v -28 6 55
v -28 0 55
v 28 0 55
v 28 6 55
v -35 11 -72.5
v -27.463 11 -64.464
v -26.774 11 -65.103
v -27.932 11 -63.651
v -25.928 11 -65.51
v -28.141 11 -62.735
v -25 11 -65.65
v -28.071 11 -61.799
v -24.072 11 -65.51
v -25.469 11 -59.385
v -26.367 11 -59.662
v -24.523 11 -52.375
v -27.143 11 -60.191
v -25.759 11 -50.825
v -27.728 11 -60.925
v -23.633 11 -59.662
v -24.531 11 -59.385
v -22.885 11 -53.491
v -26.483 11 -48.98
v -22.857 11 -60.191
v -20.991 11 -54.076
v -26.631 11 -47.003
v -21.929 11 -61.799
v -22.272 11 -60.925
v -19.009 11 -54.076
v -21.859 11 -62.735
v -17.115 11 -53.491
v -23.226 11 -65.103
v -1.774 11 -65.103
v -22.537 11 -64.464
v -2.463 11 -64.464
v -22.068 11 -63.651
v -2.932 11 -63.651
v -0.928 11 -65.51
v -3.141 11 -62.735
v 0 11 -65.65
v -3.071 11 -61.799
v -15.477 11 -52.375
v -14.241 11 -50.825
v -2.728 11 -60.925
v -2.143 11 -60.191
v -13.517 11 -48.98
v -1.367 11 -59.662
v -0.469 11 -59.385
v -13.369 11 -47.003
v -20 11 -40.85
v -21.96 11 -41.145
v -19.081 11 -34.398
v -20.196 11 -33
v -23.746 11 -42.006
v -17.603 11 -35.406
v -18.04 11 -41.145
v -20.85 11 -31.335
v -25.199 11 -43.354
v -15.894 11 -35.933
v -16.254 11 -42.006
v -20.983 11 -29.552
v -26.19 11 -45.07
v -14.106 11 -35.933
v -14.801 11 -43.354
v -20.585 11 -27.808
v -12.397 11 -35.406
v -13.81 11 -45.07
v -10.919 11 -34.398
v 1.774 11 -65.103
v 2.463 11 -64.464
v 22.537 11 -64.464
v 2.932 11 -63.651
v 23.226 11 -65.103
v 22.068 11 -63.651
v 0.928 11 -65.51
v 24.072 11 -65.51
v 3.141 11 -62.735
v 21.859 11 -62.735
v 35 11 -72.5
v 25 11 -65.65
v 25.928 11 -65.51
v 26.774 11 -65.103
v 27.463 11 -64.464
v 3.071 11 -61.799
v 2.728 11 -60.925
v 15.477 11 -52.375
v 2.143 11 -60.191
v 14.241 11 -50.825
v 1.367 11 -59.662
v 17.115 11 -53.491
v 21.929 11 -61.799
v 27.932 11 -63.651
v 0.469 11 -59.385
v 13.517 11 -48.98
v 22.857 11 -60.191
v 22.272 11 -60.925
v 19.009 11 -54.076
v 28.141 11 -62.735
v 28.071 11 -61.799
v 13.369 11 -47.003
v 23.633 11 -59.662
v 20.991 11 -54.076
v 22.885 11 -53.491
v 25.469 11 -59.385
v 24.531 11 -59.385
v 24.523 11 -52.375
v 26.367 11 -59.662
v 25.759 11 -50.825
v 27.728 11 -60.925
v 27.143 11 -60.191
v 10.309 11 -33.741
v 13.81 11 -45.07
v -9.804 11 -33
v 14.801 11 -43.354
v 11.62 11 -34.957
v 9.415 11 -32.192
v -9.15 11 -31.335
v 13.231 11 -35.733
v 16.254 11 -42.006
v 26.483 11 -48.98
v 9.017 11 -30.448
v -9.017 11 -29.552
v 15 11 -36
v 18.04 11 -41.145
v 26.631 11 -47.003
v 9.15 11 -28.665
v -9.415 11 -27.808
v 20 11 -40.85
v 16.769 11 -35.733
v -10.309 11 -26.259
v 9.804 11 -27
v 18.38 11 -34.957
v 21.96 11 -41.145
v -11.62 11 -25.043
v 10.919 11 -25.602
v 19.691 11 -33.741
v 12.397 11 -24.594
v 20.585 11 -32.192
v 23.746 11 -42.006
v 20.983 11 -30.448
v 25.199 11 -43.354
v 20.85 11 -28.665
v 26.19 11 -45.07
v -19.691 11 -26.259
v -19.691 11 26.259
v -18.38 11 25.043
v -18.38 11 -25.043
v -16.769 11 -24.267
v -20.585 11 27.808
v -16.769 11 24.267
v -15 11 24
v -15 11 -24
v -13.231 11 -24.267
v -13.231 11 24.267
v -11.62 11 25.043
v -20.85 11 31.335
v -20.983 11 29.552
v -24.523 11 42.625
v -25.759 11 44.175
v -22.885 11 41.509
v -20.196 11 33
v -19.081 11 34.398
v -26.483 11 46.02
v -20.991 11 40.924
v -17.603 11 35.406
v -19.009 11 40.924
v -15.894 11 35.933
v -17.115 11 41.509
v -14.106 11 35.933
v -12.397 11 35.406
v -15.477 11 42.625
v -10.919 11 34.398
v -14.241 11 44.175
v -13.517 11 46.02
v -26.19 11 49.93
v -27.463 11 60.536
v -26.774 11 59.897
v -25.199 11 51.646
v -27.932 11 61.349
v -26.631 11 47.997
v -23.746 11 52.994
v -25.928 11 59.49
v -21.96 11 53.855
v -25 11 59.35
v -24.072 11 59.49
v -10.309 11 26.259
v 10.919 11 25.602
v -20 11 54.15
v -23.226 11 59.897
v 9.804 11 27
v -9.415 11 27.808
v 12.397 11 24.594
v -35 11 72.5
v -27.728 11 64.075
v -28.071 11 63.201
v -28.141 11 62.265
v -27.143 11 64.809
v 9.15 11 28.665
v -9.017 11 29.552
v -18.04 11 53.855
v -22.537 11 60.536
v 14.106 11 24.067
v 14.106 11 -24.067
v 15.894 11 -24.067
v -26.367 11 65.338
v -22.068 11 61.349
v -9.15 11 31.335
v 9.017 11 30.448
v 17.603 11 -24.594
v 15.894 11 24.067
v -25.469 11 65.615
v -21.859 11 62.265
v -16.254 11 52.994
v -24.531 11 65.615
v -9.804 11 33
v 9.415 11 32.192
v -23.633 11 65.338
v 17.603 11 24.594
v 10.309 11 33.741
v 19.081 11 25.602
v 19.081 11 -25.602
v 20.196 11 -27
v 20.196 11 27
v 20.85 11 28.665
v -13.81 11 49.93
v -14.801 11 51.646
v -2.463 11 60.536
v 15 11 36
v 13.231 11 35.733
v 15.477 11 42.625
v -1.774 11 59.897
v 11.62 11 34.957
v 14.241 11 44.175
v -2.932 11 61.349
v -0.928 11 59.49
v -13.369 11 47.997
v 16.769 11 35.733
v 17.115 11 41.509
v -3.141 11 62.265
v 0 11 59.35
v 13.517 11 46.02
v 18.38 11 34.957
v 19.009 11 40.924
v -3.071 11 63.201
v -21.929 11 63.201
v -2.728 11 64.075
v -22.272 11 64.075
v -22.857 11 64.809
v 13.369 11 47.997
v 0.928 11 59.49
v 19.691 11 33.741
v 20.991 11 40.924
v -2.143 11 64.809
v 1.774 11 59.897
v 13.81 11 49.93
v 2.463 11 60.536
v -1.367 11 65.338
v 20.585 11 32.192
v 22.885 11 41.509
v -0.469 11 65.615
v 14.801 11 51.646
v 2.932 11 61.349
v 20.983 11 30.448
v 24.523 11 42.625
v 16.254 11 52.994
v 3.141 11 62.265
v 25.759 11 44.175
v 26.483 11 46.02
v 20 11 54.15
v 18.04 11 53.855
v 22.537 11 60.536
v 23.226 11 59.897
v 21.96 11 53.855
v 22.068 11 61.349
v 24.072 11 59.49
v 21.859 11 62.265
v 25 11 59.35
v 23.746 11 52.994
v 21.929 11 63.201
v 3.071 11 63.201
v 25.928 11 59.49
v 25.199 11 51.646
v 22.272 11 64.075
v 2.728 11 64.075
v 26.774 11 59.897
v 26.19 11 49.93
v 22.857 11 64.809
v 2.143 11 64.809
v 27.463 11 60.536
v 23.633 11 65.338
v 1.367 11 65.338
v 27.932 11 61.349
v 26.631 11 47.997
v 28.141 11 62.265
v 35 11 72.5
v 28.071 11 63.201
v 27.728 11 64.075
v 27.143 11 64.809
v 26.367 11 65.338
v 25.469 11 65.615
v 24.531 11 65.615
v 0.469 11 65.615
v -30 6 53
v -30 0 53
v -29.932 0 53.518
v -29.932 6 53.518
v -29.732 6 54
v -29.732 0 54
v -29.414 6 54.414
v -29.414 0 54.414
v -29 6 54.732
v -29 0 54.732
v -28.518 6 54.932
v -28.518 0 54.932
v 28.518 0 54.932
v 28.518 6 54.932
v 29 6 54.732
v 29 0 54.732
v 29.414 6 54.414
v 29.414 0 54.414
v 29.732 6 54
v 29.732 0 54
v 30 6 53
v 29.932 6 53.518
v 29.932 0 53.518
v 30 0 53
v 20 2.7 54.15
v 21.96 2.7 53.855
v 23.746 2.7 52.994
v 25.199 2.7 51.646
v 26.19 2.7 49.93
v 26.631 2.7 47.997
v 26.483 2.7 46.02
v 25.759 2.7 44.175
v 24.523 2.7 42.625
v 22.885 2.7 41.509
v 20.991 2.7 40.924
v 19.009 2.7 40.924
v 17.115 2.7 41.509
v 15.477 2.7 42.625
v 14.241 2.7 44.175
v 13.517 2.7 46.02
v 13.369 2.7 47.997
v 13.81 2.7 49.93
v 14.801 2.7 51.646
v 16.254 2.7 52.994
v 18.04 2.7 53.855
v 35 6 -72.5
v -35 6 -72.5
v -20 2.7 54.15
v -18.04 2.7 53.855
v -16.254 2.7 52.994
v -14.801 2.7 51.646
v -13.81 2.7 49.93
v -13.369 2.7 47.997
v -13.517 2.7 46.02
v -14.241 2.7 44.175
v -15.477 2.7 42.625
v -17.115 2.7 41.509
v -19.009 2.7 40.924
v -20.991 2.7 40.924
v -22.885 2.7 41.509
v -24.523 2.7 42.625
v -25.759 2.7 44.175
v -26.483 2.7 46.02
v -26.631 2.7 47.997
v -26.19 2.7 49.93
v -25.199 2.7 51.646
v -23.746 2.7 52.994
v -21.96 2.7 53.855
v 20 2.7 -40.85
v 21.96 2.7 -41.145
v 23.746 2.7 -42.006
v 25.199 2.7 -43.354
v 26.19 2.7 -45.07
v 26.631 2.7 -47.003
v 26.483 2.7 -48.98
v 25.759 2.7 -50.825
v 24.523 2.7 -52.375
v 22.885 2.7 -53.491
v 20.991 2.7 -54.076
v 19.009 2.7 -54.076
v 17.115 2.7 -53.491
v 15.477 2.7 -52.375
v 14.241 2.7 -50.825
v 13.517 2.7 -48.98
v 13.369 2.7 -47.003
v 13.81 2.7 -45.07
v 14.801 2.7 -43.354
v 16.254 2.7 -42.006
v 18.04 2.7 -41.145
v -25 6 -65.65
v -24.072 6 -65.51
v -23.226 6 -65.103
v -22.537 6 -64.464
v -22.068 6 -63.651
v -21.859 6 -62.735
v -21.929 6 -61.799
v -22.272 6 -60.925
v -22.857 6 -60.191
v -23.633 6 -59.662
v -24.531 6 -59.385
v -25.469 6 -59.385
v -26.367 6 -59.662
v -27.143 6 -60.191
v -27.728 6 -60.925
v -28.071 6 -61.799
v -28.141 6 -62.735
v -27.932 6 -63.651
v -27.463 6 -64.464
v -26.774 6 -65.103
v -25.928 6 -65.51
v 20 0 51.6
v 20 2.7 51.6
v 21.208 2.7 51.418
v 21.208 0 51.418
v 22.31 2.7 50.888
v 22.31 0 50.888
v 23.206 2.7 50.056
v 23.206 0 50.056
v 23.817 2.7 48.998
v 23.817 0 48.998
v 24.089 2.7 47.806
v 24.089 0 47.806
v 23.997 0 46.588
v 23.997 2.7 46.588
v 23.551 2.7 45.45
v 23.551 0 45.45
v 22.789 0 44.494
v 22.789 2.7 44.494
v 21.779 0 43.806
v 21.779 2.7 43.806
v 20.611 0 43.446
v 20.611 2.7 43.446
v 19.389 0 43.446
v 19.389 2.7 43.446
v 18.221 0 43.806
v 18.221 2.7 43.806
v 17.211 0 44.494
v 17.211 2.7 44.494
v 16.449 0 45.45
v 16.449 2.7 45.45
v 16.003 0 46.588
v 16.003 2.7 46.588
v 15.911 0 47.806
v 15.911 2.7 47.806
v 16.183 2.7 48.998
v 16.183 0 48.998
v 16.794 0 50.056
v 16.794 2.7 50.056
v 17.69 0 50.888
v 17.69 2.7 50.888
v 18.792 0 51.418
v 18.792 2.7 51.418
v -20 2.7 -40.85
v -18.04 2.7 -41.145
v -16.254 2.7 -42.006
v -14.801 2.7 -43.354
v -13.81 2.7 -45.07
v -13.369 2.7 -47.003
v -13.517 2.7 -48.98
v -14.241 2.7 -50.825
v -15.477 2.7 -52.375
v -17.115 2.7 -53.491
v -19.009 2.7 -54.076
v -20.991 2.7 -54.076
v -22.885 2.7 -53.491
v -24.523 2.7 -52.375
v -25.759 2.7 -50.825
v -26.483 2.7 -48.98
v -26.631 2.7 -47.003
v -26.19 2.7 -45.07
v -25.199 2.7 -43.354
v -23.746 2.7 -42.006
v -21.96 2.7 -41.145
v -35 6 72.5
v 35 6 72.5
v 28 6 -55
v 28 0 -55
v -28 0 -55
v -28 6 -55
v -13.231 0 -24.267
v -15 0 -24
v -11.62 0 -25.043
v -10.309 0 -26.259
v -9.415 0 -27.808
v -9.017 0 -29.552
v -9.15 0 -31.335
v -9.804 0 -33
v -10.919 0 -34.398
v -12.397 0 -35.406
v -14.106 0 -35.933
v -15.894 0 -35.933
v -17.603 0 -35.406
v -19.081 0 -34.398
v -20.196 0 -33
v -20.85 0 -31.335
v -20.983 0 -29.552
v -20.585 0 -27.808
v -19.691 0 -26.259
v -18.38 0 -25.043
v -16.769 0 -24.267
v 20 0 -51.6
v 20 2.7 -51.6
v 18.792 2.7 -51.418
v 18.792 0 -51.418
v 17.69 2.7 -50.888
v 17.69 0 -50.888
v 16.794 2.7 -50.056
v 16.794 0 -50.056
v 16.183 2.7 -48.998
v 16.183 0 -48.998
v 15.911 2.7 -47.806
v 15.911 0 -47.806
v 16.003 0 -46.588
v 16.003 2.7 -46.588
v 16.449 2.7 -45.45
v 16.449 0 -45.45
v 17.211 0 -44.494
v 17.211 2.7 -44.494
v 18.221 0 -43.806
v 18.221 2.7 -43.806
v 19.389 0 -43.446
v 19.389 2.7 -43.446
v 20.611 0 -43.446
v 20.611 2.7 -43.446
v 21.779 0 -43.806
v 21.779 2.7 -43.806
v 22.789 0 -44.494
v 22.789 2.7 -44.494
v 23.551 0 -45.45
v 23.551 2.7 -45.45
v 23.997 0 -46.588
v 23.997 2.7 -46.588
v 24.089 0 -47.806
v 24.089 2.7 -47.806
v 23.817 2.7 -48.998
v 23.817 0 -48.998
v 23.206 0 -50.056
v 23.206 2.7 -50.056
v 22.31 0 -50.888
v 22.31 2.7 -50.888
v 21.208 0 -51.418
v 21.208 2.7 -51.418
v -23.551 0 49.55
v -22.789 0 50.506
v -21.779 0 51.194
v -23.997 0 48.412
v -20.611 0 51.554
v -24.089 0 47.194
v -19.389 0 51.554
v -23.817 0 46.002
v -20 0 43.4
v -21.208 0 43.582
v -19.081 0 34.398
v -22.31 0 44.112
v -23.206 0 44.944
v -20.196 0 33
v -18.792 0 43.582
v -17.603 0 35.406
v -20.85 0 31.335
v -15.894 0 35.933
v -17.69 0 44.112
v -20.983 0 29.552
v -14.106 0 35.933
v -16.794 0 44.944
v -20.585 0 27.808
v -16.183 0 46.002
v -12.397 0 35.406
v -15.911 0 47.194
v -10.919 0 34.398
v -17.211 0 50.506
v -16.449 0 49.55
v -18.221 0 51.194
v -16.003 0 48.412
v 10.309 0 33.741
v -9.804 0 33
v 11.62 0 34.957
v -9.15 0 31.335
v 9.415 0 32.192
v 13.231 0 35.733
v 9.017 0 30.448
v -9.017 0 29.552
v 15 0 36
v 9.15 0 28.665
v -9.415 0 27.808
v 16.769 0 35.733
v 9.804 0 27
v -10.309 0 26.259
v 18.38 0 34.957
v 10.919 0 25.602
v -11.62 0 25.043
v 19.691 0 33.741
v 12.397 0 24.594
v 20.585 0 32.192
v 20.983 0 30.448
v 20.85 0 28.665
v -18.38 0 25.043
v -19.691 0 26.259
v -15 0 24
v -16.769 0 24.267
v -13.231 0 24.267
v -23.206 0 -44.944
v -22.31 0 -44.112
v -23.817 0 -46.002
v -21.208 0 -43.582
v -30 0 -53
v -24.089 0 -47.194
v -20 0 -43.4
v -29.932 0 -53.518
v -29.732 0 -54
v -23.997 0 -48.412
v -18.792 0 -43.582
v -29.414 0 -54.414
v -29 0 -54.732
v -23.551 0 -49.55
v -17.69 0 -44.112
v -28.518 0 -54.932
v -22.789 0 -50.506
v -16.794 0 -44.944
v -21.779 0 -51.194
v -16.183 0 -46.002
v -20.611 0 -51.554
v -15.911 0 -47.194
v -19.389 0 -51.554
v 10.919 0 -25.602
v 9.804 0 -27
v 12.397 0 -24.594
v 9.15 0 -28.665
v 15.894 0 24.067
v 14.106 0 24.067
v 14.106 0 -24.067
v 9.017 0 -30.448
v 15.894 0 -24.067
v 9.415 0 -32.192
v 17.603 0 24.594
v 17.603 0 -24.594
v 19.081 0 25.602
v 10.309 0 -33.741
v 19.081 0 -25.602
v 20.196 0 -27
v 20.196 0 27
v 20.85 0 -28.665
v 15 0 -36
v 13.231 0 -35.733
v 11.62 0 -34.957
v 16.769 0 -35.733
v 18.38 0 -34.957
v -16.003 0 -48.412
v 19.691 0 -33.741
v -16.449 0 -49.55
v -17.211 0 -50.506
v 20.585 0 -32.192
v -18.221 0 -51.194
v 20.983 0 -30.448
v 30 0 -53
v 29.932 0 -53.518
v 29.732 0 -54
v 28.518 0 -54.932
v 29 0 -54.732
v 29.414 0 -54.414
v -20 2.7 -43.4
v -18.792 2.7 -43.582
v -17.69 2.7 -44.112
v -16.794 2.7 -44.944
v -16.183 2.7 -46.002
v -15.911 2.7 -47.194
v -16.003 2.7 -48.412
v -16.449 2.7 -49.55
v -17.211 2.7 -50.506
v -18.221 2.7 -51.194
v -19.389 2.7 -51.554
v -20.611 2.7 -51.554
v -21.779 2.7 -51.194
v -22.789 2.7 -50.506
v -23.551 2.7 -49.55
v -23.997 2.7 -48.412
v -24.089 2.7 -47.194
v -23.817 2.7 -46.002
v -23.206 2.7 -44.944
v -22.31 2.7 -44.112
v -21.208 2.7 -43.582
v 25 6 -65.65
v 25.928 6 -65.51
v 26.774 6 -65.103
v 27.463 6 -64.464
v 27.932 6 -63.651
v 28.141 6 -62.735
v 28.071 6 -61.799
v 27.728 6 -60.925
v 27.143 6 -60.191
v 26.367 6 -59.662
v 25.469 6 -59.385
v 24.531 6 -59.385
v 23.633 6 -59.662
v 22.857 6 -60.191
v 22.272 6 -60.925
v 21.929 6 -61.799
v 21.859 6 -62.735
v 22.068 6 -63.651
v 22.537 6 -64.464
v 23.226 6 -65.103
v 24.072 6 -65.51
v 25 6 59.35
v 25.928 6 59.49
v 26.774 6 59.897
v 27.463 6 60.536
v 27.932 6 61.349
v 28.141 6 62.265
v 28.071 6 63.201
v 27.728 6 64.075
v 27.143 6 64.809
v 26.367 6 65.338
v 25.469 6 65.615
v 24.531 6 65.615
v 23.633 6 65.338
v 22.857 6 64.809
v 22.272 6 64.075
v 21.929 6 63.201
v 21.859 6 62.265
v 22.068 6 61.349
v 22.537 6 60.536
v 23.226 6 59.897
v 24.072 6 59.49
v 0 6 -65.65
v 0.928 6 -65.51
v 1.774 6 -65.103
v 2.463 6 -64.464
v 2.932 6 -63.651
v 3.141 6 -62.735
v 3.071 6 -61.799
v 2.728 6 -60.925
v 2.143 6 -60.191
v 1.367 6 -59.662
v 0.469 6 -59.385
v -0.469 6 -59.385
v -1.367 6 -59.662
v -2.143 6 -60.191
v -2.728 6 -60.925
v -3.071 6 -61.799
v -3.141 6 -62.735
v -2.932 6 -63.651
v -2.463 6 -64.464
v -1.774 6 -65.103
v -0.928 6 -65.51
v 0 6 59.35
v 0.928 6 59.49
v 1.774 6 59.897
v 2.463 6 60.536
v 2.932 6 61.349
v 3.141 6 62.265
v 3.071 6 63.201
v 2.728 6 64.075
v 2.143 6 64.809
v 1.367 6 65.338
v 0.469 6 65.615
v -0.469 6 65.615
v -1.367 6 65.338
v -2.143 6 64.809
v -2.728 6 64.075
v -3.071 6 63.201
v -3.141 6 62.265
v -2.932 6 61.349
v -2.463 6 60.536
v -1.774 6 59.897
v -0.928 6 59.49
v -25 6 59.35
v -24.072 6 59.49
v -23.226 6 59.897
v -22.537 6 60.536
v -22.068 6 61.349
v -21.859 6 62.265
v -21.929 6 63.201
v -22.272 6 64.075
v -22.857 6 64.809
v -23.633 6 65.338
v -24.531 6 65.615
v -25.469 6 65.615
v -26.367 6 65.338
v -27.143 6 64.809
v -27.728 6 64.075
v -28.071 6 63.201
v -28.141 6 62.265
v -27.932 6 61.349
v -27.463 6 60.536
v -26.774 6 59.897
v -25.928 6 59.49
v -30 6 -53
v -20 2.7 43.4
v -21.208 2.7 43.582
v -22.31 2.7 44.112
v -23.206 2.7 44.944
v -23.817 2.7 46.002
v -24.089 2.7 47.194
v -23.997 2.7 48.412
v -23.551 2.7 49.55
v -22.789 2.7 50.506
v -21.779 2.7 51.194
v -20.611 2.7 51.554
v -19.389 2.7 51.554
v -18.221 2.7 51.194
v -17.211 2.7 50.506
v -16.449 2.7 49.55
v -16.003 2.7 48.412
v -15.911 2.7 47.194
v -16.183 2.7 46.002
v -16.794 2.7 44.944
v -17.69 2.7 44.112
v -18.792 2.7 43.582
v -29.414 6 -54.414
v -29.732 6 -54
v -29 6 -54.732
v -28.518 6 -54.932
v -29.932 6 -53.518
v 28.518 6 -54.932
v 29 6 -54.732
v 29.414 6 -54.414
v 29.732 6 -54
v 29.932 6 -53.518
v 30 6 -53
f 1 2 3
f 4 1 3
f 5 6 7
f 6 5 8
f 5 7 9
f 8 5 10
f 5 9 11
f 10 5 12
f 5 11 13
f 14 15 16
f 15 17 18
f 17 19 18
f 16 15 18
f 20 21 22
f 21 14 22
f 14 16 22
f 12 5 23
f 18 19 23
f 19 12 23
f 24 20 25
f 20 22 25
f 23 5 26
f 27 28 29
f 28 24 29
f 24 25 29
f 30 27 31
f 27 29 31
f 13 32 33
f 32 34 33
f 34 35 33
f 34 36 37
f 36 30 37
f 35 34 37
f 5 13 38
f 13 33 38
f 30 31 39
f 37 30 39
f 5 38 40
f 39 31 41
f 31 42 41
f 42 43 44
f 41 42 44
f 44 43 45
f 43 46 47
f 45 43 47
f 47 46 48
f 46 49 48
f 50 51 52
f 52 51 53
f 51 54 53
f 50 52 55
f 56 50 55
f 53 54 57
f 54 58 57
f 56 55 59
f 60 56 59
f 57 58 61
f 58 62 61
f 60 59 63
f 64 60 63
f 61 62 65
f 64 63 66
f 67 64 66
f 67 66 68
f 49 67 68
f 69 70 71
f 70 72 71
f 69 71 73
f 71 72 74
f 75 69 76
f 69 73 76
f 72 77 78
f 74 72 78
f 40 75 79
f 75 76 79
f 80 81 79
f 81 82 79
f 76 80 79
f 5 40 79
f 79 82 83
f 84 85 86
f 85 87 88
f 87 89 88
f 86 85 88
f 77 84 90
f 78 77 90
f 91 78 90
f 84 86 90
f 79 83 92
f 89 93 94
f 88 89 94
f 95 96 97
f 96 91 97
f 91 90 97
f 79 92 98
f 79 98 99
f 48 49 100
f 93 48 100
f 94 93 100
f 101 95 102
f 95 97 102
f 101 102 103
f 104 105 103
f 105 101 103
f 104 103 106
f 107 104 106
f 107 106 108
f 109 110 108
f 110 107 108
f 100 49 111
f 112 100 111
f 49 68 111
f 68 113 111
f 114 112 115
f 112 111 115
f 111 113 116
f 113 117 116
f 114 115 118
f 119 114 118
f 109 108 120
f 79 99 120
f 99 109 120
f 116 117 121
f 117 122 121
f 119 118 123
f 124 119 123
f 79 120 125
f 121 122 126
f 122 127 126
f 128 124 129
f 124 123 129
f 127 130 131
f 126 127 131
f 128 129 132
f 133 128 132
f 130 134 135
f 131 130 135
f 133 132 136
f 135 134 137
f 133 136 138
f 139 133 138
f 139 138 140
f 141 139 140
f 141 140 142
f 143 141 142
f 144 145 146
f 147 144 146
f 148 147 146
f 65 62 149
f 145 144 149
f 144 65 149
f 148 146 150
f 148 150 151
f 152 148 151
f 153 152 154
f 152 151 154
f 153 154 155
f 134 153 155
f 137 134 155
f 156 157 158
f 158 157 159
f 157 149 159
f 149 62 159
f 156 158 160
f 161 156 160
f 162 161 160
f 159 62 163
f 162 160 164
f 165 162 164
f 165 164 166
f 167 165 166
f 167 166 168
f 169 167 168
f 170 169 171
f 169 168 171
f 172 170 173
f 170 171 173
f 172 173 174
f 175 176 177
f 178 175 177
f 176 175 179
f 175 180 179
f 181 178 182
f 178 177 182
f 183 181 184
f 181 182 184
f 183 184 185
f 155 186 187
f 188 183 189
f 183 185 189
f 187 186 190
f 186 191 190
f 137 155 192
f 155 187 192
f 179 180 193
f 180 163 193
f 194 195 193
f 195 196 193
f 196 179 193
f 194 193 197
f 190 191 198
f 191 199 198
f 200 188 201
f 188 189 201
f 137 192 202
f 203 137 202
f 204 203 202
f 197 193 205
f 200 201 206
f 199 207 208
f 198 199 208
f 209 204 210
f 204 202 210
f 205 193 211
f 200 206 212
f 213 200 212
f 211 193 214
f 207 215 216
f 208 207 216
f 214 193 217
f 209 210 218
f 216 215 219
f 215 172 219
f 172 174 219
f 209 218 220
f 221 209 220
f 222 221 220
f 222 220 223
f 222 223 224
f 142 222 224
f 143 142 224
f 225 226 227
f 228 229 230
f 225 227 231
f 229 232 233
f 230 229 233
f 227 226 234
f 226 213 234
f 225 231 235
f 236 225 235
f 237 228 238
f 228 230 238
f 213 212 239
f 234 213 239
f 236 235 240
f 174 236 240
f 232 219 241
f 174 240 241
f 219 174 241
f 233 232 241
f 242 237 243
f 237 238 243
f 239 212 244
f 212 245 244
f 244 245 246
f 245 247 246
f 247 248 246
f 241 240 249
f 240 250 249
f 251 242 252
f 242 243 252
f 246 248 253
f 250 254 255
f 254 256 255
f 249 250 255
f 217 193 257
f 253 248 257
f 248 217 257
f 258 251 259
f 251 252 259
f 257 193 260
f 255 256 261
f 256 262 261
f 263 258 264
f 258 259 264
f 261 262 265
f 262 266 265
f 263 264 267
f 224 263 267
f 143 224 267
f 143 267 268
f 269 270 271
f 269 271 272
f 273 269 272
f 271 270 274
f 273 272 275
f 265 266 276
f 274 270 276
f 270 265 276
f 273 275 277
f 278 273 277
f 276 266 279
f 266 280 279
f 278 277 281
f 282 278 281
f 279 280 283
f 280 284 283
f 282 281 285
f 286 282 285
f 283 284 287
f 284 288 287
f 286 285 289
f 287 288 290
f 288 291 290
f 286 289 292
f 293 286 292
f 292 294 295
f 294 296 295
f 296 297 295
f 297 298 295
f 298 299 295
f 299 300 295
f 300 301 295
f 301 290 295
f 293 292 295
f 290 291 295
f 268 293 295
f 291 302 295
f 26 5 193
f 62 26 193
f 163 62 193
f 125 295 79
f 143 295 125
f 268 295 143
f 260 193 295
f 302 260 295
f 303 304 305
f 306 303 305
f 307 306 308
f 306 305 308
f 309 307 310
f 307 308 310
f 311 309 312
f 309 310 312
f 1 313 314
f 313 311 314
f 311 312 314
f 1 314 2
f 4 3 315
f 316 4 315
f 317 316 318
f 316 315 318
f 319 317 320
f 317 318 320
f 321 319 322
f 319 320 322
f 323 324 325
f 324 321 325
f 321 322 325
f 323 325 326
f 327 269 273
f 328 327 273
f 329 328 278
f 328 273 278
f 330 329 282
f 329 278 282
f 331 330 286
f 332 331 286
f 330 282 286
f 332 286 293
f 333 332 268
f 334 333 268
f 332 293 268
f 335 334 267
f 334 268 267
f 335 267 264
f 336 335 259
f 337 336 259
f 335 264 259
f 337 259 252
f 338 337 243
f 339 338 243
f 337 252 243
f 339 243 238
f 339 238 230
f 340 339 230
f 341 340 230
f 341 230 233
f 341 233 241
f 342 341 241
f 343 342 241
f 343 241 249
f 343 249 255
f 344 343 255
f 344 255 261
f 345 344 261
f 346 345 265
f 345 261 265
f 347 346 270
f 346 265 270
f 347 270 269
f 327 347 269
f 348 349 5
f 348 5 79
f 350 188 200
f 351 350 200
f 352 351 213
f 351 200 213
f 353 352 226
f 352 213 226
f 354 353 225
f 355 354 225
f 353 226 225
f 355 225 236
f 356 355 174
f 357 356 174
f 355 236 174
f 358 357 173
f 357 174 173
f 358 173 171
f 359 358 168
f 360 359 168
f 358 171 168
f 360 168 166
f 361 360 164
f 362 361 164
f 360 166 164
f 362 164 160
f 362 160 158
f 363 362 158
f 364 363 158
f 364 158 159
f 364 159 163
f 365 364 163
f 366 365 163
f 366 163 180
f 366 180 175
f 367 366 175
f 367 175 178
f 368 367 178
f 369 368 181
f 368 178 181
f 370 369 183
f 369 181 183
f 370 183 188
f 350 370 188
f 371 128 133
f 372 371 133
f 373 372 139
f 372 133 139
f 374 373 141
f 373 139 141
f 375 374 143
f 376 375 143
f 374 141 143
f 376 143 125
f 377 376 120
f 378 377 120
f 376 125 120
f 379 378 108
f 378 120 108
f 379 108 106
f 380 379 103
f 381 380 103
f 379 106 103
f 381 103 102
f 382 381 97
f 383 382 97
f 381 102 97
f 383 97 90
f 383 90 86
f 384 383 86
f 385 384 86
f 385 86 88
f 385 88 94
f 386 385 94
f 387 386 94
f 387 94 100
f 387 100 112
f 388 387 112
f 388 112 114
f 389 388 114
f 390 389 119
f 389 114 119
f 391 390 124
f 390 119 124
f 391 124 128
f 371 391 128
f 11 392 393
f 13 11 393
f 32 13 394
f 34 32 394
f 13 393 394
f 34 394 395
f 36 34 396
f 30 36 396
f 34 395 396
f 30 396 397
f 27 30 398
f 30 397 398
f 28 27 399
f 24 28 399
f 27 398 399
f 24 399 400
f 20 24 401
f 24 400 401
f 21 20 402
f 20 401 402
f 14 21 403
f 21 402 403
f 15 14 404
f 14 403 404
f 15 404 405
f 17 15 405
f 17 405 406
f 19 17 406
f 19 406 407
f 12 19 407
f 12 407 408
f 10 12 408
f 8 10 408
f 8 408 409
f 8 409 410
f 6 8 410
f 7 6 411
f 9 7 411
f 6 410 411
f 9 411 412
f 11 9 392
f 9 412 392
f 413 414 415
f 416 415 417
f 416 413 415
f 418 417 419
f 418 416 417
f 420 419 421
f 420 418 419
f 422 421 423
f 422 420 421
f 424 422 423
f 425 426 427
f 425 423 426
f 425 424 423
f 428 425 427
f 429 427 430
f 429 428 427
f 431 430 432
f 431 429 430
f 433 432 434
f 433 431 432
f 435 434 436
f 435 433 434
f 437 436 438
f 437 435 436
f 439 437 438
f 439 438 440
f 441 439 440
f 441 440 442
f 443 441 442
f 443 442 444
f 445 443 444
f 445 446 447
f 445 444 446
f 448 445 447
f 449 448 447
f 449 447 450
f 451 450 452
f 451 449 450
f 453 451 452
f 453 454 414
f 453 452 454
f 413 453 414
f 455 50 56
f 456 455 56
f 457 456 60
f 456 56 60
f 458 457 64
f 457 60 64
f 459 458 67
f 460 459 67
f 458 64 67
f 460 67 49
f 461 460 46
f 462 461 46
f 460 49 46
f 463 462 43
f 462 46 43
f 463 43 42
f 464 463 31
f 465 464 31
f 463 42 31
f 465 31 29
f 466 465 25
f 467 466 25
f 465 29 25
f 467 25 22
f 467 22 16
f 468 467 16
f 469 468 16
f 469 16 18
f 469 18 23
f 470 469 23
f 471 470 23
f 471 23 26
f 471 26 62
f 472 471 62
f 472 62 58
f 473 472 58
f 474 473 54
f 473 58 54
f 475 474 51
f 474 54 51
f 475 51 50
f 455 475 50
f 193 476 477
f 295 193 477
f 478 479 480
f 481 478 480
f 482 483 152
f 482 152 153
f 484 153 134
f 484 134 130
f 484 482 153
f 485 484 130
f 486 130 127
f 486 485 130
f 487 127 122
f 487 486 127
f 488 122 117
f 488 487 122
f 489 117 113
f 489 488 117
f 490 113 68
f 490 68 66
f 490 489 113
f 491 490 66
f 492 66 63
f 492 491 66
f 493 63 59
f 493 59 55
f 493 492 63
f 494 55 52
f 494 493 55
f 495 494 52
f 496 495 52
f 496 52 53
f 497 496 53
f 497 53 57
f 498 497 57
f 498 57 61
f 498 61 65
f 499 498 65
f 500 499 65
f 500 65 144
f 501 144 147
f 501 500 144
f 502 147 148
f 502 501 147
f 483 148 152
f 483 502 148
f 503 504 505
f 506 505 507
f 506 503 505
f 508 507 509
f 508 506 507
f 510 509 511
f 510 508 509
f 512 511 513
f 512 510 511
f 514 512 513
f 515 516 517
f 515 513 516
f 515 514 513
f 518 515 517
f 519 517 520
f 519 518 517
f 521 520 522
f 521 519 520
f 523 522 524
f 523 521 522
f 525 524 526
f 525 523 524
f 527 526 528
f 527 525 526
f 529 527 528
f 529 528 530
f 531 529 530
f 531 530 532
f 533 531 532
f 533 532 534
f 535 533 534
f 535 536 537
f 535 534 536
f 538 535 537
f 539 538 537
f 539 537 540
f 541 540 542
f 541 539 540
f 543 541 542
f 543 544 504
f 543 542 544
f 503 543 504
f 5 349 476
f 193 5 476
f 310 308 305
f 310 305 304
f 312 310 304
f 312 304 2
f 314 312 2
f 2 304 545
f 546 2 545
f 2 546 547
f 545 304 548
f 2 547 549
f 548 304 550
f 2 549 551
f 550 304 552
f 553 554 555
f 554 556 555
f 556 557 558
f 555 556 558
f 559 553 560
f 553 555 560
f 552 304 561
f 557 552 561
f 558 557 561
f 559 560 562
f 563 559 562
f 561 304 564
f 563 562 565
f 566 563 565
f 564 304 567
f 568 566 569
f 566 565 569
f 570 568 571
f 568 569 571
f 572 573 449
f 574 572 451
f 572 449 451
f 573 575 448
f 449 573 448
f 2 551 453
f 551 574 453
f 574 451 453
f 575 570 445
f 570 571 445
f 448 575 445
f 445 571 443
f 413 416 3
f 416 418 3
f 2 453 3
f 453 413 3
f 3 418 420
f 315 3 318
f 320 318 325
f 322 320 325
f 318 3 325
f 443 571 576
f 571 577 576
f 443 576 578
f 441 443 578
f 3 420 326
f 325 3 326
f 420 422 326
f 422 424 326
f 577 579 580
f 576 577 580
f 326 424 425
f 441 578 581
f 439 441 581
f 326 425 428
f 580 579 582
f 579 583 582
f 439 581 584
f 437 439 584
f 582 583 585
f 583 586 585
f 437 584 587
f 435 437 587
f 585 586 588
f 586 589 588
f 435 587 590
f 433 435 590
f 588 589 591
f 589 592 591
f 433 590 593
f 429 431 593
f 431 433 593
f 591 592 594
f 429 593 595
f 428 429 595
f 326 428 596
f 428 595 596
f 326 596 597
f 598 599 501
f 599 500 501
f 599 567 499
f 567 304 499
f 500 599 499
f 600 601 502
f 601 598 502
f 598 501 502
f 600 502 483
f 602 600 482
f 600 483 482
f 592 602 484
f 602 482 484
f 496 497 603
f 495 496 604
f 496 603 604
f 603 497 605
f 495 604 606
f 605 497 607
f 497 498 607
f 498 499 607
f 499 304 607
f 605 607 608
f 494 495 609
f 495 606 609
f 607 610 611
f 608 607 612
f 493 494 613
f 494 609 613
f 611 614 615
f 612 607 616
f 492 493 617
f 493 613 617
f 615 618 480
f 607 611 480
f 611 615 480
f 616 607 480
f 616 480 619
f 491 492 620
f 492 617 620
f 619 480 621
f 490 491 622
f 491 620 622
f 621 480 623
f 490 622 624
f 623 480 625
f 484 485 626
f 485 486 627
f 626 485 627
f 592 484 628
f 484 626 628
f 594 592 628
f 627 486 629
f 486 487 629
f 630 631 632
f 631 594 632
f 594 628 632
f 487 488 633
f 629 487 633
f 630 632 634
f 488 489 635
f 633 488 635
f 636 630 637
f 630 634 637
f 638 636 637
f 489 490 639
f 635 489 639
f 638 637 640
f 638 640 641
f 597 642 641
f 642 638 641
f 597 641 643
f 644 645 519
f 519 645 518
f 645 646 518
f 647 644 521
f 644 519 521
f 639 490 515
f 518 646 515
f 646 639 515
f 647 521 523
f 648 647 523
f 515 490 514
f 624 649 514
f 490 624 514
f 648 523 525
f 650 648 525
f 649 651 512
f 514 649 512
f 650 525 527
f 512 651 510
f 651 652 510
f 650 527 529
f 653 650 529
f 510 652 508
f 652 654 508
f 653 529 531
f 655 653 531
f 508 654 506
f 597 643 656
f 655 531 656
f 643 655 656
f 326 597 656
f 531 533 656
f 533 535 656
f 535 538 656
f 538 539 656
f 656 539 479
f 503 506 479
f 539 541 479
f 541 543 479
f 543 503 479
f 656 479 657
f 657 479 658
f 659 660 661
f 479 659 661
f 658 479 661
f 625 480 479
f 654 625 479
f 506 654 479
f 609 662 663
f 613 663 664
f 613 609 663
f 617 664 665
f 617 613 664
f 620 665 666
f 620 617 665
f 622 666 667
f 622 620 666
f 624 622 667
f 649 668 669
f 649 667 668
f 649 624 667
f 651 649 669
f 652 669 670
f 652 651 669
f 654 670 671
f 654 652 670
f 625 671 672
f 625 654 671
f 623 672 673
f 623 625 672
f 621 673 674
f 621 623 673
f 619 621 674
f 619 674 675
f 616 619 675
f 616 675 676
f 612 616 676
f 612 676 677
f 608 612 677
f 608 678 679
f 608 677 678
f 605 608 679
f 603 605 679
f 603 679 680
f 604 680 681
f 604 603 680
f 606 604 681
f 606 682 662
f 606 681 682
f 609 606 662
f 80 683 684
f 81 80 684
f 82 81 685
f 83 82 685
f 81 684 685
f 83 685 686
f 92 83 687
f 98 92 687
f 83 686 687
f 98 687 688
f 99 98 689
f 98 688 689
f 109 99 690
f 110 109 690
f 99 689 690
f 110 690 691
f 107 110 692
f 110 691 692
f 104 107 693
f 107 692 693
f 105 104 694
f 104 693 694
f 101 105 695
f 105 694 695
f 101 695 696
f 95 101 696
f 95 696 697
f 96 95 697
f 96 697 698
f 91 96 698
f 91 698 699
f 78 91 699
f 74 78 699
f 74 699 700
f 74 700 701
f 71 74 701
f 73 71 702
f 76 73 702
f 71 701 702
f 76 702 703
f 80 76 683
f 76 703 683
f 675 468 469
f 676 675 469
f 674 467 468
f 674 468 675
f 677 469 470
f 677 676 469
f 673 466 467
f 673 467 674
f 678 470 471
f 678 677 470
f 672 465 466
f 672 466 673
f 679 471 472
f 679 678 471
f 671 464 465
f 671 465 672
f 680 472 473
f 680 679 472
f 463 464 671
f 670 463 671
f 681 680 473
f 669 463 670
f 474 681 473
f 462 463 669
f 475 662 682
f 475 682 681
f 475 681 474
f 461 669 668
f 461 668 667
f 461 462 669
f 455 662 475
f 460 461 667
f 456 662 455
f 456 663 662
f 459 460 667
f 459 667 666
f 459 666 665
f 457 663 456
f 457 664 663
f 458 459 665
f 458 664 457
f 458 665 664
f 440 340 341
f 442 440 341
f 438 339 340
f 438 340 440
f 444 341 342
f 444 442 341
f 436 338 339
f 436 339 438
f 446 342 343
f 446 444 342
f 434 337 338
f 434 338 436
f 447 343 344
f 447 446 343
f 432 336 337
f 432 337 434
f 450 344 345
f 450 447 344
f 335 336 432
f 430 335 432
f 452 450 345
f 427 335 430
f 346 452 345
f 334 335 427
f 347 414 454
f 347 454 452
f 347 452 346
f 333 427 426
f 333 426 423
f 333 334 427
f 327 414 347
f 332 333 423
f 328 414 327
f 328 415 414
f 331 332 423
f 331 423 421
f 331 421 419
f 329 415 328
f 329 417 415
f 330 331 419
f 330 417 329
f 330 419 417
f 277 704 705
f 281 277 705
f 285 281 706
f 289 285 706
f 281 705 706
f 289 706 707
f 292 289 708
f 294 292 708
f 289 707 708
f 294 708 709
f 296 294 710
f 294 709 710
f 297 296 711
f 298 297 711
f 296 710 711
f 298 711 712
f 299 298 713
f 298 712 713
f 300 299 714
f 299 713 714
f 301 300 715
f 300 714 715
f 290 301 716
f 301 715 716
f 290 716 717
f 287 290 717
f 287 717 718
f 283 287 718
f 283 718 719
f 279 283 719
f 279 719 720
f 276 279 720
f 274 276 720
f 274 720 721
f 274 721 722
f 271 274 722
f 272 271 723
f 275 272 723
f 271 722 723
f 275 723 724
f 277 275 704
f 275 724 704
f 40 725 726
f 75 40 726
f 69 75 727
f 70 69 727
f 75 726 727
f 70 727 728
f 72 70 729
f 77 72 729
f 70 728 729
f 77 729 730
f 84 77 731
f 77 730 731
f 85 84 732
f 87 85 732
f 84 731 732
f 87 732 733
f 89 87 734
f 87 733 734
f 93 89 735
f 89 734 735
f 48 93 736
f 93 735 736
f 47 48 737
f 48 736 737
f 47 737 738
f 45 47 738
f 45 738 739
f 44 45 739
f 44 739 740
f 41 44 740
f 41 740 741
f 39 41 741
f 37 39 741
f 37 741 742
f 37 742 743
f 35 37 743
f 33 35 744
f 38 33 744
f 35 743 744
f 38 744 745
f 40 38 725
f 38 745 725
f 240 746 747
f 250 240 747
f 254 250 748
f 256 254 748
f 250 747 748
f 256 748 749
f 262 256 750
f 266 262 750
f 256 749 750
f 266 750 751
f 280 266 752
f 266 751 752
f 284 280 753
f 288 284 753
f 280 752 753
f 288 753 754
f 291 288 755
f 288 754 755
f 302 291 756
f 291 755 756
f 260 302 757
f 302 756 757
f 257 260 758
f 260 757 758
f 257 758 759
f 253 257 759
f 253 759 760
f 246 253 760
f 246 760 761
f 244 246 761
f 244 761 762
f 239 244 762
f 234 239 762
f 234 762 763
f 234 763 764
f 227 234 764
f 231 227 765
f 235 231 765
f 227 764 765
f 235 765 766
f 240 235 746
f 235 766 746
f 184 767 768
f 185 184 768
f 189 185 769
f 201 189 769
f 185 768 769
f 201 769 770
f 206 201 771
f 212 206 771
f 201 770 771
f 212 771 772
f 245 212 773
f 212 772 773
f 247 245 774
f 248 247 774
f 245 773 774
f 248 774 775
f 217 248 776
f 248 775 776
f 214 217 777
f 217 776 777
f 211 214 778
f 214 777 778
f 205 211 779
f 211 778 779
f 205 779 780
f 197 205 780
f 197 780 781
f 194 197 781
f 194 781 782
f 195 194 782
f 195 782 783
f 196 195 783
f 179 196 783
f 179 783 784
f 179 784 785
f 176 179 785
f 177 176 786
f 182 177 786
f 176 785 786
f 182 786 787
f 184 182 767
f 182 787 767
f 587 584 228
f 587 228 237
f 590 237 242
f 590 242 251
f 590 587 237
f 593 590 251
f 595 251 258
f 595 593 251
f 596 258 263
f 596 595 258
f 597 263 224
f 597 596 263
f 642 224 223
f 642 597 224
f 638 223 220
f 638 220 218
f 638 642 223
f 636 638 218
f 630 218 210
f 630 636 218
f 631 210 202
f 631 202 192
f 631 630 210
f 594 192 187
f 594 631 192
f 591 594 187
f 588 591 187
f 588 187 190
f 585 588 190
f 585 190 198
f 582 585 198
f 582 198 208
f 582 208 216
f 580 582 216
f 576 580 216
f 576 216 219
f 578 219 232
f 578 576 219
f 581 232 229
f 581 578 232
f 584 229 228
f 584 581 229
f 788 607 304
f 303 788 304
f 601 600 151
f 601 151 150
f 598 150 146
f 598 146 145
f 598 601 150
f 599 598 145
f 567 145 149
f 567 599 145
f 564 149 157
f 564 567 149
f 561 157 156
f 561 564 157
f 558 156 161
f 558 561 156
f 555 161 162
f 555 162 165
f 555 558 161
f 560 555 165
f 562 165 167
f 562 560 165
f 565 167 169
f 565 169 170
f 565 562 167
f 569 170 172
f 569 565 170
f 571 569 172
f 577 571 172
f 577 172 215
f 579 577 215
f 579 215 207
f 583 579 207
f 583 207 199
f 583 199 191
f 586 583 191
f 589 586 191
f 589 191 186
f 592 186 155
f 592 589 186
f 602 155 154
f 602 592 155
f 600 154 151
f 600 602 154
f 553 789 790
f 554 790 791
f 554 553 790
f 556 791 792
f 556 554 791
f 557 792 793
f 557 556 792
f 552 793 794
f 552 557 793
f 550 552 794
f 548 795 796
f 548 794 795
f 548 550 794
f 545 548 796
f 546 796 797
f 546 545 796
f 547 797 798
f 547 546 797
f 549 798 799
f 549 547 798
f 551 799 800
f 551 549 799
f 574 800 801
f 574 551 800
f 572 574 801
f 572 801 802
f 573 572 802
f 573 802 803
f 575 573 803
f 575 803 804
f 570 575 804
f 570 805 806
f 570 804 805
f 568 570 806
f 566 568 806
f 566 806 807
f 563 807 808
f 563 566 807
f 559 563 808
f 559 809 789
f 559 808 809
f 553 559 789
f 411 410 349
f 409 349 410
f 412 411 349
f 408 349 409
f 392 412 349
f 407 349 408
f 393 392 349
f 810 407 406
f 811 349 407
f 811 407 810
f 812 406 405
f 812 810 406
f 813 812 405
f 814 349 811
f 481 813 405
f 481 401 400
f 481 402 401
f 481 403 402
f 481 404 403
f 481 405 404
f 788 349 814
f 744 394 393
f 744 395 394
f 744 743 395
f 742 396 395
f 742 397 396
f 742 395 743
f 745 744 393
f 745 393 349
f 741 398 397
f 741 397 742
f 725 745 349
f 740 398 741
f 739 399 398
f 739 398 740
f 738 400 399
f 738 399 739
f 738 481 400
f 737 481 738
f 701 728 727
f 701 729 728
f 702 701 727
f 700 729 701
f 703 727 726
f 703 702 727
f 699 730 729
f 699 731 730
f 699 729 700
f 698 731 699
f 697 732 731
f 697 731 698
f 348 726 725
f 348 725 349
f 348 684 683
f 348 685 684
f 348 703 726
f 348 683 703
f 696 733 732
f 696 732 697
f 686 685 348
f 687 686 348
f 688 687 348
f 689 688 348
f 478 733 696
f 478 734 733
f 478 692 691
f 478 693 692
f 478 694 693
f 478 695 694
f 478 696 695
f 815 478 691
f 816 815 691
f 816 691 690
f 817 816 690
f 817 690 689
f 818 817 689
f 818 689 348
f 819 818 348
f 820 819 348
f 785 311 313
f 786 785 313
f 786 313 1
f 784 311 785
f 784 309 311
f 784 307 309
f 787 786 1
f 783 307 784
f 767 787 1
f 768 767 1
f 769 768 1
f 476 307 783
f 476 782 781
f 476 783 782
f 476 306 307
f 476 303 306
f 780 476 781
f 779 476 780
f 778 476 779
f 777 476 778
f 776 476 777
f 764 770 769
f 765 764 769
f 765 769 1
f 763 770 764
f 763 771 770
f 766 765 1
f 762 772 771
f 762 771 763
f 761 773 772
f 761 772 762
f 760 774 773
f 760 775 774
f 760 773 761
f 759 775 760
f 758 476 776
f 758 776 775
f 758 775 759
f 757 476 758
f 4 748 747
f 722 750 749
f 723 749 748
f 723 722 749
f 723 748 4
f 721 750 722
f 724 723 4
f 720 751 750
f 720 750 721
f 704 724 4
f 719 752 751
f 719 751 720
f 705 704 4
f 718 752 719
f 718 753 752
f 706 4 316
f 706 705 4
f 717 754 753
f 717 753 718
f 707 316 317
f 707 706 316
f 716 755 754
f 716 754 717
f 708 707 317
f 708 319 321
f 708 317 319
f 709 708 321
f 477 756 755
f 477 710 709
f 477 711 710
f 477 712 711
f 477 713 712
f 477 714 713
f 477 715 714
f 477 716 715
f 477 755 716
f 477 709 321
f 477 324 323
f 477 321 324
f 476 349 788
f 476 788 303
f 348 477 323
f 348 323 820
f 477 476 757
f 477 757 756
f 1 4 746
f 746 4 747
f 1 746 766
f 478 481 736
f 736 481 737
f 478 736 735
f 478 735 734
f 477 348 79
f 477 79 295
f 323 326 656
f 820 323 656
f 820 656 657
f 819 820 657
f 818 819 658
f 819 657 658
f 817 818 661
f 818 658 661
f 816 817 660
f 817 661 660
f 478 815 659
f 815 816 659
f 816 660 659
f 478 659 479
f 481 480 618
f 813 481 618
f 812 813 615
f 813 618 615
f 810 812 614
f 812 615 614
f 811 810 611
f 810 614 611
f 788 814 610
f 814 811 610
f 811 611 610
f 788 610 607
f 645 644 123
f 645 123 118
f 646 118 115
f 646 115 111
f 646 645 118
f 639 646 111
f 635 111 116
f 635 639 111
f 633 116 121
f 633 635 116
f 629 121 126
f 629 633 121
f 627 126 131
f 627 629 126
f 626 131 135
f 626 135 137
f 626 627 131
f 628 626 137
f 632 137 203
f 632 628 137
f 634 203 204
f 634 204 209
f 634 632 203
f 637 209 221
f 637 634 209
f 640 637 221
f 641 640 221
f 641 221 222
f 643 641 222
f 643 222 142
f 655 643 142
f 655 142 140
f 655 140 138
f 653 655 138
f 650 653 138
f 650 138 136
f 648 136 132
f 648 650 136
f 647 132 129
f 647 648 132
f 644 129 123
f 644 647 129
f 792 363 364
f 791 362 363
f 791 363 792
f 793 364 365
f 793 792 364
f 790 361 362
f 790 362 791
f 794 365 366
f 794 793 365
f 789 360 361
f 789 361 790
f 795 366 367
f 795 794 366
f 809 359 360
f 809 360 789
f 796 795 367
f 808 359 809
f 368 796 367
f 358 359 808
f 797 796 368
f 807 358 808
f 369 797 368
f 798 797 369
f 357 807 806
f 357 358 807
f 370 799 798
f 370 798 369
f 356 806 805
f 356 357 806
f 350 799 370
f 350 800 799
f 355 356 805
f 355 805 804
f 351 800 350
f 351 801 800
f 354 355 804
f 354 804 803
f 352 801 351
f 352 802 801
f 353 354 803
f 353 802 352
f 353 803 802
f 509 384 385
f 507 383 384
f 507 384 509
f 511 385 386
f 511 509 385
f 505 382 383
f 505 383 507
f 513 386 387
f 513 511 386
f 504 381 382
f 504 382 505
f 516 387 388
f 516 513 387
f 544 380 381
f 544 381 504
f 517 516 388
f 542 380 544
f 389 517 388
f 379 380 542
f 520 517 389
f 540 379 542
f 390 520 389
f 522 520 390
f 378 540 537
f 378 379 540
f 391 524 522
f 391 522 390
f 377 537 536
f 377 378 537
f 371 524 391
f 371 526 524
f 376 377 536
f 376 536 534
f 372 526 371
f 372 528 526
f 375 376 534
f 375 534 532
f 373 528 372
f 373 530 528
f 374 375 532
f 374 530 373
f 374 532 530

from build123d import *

# Parameters (mm, degrees)
SKETCH_1_R          = 4.1
SKETCH_1_R_2        = 6
EXTRUDE_1_DEPTH     = 11
SKETCH_2_R          = 6.65
CUT_EXTRUDE_1_DEPTH = 8.3
EXTRUDE_START       = -6
SKETCH_3_W          = 70
SKETCH_3_H          = 145
SKETCH_3_R          = 3.15
EXTRUDE_2_DEPTH     = 5


with BuildPart() as part:
    # 草图1 → 凸台-拉伸1 (new body)
    with BuildSketch(Plane(origin=(0, 0, 0), x_dir=(1, 0, 0), z_dir=(0, 1, 0))):
        with BuildLine():
            Line((-28, -55), (28, -55))
            ThreePointArc((28, -55), (29.414213562, -54.414213562), (30, -53))
            Line((30, -53), (30, 53))
            ThreePointArc((30, 53), (29.414213562, 54.414213562), (28, 55))
            Line((28, 55), (-28, 55))
            ThreePointArc((-28, 55), (-29.414213562, 54.414213562), (-30, 53))
            Line((-30, 53), (-30, -53))
            ThreePointArc((-30, -53), (-29.414213562, -54.414213562), (-28, -55))
        make_face()
        with Locations(Location((-20, 47.5, 0), (0, 0, 270))):
            Circle(SKETCH_1_R, mode=Mode.SUBTRACT)
        with Locations(Location((20, 47.5, 0), (0, 0, 90))):
            Circle(SKETCH_1_R, mode=Mode.SUBTRACT)
        with Locations(Location((-20, -47.5, 0), (0, 0, 90))):
            Circle(SKETCH_1_R, mode=Mode.SUBTRACT)
        with Locations(Location((20, -47.5, 0), (0, 0, 270))):
            Circle(SKETCH_1_R, mode=Mode.SUBTRACT)
        with Locations(Location((-15, 30, 0), (0, 0, 270))):
            Circle(SKETCH_1_R_2, mode=Mode.SUBTRACT)
        with Locations(Location((15, 30, 0), (0, 0, 90))):
            Circle(SKETCH_1_R_2, mode=Mode.SUBTRACT)
        with Locations(Location((15, -30, 0), (0, 0, 270))):
            Circle(SKETCH_1_R_2, mode=Mode.SUBTRACT)
        with Locations(Location((-15, -30, 0), (0, 0, 90))):
            Circle(SKETCH_1_R_2, mode=Mode.SUBTRACT)
    extrude(amount=EXTRUDE_1_DEPTH)

    # 草图2 → 切除-拉伸1 (cut)
    with BuildSketch(Plane(origin=(0, 11, 0), x_dir=(1, 0, 0), z_dir=(0, 1, 0))):
        with Locations(Location((-20, 47.5, 0), (0, 0, 270))):
            Circle(SKETCH_2_R)
        with Locations(Location((-20, -47.5, 0), (0, 0, 270))):
            Circle(SKETCH_2_R)
        with Locations(Location((20, 47.5, 0), (0, 0, 270))):
            Circle(SKETCH_2_R)
        with Locations(Location((20, -47.5, 0), (0, 0, 270))):
            Circle(SKETCH_2_R)
    extrude(amount=-CUT_EXTRUDE_1_DEPTH, mode=Mode.SUBTRACT)

    # 草图3 → 凸台-拉伸2 (add)
    with BuildSketch(Plane.XZ.offset(EXTRUDE_START)):
        Rectangle(SKETCH_3_W, SKETCH_3_H)
        with Locations(Location((-25, 62.5, 0), (0, 0, 270))):
            Circle(SKETCH_3_R, mode=Mode.SUBTRACT)
        with Locations(Location((25, 62.5, 0), (0, 0, 270))):
            Circle(SKETCH_3_R, mode=Mode.SUBTRACT)
        with Locations(Location((25, -62.5, 0), (0, 0, 270))):
            Circle(SKETCH_3_R, mode=Mode.SUBTRACT)
        with Locations(Location((-25, -62.5, 0), (0, 0, 270))):
            Circle(SKETCH_3_R, mode=Mode.SUBTRACT)
        with Locations(Location((0, 62.5, 0), (0, 0, 270))):
            Circle(SKETCH_3_R, mode=Mode.SUBTRACT)
        with Locations(Location((0, -62.5, 0), (0, 0, 270))):
            Circle(SKETCH_3_R, mode=Mode.SUBTRACT)
        with BuildLine():
            Line((-30, 53), (-30, -53))
            ThreePointArc((-30, -53), (-29.414213562, -54.414213562), (-28, -55))
            Line((-28, -55), (28, -55))
            ThreePointArc((28, -55), (29.414213562, -54.414213562), (30, -53))
            Line((30, -53), (30, 53))
            ThreePointArc((30, 53), (29.414213562, 54.414213562), (28, 55))
            Line((28, 55), (-28, 55))
            ThreePointArc((-28, 55), (-29.414213562, 54.414213562), (-30, 53))
        make_face(mode=Mode.SUBTRACT)
    extrude(amount=-EXTRUDE_2_DEPTH)


solid = part.part
